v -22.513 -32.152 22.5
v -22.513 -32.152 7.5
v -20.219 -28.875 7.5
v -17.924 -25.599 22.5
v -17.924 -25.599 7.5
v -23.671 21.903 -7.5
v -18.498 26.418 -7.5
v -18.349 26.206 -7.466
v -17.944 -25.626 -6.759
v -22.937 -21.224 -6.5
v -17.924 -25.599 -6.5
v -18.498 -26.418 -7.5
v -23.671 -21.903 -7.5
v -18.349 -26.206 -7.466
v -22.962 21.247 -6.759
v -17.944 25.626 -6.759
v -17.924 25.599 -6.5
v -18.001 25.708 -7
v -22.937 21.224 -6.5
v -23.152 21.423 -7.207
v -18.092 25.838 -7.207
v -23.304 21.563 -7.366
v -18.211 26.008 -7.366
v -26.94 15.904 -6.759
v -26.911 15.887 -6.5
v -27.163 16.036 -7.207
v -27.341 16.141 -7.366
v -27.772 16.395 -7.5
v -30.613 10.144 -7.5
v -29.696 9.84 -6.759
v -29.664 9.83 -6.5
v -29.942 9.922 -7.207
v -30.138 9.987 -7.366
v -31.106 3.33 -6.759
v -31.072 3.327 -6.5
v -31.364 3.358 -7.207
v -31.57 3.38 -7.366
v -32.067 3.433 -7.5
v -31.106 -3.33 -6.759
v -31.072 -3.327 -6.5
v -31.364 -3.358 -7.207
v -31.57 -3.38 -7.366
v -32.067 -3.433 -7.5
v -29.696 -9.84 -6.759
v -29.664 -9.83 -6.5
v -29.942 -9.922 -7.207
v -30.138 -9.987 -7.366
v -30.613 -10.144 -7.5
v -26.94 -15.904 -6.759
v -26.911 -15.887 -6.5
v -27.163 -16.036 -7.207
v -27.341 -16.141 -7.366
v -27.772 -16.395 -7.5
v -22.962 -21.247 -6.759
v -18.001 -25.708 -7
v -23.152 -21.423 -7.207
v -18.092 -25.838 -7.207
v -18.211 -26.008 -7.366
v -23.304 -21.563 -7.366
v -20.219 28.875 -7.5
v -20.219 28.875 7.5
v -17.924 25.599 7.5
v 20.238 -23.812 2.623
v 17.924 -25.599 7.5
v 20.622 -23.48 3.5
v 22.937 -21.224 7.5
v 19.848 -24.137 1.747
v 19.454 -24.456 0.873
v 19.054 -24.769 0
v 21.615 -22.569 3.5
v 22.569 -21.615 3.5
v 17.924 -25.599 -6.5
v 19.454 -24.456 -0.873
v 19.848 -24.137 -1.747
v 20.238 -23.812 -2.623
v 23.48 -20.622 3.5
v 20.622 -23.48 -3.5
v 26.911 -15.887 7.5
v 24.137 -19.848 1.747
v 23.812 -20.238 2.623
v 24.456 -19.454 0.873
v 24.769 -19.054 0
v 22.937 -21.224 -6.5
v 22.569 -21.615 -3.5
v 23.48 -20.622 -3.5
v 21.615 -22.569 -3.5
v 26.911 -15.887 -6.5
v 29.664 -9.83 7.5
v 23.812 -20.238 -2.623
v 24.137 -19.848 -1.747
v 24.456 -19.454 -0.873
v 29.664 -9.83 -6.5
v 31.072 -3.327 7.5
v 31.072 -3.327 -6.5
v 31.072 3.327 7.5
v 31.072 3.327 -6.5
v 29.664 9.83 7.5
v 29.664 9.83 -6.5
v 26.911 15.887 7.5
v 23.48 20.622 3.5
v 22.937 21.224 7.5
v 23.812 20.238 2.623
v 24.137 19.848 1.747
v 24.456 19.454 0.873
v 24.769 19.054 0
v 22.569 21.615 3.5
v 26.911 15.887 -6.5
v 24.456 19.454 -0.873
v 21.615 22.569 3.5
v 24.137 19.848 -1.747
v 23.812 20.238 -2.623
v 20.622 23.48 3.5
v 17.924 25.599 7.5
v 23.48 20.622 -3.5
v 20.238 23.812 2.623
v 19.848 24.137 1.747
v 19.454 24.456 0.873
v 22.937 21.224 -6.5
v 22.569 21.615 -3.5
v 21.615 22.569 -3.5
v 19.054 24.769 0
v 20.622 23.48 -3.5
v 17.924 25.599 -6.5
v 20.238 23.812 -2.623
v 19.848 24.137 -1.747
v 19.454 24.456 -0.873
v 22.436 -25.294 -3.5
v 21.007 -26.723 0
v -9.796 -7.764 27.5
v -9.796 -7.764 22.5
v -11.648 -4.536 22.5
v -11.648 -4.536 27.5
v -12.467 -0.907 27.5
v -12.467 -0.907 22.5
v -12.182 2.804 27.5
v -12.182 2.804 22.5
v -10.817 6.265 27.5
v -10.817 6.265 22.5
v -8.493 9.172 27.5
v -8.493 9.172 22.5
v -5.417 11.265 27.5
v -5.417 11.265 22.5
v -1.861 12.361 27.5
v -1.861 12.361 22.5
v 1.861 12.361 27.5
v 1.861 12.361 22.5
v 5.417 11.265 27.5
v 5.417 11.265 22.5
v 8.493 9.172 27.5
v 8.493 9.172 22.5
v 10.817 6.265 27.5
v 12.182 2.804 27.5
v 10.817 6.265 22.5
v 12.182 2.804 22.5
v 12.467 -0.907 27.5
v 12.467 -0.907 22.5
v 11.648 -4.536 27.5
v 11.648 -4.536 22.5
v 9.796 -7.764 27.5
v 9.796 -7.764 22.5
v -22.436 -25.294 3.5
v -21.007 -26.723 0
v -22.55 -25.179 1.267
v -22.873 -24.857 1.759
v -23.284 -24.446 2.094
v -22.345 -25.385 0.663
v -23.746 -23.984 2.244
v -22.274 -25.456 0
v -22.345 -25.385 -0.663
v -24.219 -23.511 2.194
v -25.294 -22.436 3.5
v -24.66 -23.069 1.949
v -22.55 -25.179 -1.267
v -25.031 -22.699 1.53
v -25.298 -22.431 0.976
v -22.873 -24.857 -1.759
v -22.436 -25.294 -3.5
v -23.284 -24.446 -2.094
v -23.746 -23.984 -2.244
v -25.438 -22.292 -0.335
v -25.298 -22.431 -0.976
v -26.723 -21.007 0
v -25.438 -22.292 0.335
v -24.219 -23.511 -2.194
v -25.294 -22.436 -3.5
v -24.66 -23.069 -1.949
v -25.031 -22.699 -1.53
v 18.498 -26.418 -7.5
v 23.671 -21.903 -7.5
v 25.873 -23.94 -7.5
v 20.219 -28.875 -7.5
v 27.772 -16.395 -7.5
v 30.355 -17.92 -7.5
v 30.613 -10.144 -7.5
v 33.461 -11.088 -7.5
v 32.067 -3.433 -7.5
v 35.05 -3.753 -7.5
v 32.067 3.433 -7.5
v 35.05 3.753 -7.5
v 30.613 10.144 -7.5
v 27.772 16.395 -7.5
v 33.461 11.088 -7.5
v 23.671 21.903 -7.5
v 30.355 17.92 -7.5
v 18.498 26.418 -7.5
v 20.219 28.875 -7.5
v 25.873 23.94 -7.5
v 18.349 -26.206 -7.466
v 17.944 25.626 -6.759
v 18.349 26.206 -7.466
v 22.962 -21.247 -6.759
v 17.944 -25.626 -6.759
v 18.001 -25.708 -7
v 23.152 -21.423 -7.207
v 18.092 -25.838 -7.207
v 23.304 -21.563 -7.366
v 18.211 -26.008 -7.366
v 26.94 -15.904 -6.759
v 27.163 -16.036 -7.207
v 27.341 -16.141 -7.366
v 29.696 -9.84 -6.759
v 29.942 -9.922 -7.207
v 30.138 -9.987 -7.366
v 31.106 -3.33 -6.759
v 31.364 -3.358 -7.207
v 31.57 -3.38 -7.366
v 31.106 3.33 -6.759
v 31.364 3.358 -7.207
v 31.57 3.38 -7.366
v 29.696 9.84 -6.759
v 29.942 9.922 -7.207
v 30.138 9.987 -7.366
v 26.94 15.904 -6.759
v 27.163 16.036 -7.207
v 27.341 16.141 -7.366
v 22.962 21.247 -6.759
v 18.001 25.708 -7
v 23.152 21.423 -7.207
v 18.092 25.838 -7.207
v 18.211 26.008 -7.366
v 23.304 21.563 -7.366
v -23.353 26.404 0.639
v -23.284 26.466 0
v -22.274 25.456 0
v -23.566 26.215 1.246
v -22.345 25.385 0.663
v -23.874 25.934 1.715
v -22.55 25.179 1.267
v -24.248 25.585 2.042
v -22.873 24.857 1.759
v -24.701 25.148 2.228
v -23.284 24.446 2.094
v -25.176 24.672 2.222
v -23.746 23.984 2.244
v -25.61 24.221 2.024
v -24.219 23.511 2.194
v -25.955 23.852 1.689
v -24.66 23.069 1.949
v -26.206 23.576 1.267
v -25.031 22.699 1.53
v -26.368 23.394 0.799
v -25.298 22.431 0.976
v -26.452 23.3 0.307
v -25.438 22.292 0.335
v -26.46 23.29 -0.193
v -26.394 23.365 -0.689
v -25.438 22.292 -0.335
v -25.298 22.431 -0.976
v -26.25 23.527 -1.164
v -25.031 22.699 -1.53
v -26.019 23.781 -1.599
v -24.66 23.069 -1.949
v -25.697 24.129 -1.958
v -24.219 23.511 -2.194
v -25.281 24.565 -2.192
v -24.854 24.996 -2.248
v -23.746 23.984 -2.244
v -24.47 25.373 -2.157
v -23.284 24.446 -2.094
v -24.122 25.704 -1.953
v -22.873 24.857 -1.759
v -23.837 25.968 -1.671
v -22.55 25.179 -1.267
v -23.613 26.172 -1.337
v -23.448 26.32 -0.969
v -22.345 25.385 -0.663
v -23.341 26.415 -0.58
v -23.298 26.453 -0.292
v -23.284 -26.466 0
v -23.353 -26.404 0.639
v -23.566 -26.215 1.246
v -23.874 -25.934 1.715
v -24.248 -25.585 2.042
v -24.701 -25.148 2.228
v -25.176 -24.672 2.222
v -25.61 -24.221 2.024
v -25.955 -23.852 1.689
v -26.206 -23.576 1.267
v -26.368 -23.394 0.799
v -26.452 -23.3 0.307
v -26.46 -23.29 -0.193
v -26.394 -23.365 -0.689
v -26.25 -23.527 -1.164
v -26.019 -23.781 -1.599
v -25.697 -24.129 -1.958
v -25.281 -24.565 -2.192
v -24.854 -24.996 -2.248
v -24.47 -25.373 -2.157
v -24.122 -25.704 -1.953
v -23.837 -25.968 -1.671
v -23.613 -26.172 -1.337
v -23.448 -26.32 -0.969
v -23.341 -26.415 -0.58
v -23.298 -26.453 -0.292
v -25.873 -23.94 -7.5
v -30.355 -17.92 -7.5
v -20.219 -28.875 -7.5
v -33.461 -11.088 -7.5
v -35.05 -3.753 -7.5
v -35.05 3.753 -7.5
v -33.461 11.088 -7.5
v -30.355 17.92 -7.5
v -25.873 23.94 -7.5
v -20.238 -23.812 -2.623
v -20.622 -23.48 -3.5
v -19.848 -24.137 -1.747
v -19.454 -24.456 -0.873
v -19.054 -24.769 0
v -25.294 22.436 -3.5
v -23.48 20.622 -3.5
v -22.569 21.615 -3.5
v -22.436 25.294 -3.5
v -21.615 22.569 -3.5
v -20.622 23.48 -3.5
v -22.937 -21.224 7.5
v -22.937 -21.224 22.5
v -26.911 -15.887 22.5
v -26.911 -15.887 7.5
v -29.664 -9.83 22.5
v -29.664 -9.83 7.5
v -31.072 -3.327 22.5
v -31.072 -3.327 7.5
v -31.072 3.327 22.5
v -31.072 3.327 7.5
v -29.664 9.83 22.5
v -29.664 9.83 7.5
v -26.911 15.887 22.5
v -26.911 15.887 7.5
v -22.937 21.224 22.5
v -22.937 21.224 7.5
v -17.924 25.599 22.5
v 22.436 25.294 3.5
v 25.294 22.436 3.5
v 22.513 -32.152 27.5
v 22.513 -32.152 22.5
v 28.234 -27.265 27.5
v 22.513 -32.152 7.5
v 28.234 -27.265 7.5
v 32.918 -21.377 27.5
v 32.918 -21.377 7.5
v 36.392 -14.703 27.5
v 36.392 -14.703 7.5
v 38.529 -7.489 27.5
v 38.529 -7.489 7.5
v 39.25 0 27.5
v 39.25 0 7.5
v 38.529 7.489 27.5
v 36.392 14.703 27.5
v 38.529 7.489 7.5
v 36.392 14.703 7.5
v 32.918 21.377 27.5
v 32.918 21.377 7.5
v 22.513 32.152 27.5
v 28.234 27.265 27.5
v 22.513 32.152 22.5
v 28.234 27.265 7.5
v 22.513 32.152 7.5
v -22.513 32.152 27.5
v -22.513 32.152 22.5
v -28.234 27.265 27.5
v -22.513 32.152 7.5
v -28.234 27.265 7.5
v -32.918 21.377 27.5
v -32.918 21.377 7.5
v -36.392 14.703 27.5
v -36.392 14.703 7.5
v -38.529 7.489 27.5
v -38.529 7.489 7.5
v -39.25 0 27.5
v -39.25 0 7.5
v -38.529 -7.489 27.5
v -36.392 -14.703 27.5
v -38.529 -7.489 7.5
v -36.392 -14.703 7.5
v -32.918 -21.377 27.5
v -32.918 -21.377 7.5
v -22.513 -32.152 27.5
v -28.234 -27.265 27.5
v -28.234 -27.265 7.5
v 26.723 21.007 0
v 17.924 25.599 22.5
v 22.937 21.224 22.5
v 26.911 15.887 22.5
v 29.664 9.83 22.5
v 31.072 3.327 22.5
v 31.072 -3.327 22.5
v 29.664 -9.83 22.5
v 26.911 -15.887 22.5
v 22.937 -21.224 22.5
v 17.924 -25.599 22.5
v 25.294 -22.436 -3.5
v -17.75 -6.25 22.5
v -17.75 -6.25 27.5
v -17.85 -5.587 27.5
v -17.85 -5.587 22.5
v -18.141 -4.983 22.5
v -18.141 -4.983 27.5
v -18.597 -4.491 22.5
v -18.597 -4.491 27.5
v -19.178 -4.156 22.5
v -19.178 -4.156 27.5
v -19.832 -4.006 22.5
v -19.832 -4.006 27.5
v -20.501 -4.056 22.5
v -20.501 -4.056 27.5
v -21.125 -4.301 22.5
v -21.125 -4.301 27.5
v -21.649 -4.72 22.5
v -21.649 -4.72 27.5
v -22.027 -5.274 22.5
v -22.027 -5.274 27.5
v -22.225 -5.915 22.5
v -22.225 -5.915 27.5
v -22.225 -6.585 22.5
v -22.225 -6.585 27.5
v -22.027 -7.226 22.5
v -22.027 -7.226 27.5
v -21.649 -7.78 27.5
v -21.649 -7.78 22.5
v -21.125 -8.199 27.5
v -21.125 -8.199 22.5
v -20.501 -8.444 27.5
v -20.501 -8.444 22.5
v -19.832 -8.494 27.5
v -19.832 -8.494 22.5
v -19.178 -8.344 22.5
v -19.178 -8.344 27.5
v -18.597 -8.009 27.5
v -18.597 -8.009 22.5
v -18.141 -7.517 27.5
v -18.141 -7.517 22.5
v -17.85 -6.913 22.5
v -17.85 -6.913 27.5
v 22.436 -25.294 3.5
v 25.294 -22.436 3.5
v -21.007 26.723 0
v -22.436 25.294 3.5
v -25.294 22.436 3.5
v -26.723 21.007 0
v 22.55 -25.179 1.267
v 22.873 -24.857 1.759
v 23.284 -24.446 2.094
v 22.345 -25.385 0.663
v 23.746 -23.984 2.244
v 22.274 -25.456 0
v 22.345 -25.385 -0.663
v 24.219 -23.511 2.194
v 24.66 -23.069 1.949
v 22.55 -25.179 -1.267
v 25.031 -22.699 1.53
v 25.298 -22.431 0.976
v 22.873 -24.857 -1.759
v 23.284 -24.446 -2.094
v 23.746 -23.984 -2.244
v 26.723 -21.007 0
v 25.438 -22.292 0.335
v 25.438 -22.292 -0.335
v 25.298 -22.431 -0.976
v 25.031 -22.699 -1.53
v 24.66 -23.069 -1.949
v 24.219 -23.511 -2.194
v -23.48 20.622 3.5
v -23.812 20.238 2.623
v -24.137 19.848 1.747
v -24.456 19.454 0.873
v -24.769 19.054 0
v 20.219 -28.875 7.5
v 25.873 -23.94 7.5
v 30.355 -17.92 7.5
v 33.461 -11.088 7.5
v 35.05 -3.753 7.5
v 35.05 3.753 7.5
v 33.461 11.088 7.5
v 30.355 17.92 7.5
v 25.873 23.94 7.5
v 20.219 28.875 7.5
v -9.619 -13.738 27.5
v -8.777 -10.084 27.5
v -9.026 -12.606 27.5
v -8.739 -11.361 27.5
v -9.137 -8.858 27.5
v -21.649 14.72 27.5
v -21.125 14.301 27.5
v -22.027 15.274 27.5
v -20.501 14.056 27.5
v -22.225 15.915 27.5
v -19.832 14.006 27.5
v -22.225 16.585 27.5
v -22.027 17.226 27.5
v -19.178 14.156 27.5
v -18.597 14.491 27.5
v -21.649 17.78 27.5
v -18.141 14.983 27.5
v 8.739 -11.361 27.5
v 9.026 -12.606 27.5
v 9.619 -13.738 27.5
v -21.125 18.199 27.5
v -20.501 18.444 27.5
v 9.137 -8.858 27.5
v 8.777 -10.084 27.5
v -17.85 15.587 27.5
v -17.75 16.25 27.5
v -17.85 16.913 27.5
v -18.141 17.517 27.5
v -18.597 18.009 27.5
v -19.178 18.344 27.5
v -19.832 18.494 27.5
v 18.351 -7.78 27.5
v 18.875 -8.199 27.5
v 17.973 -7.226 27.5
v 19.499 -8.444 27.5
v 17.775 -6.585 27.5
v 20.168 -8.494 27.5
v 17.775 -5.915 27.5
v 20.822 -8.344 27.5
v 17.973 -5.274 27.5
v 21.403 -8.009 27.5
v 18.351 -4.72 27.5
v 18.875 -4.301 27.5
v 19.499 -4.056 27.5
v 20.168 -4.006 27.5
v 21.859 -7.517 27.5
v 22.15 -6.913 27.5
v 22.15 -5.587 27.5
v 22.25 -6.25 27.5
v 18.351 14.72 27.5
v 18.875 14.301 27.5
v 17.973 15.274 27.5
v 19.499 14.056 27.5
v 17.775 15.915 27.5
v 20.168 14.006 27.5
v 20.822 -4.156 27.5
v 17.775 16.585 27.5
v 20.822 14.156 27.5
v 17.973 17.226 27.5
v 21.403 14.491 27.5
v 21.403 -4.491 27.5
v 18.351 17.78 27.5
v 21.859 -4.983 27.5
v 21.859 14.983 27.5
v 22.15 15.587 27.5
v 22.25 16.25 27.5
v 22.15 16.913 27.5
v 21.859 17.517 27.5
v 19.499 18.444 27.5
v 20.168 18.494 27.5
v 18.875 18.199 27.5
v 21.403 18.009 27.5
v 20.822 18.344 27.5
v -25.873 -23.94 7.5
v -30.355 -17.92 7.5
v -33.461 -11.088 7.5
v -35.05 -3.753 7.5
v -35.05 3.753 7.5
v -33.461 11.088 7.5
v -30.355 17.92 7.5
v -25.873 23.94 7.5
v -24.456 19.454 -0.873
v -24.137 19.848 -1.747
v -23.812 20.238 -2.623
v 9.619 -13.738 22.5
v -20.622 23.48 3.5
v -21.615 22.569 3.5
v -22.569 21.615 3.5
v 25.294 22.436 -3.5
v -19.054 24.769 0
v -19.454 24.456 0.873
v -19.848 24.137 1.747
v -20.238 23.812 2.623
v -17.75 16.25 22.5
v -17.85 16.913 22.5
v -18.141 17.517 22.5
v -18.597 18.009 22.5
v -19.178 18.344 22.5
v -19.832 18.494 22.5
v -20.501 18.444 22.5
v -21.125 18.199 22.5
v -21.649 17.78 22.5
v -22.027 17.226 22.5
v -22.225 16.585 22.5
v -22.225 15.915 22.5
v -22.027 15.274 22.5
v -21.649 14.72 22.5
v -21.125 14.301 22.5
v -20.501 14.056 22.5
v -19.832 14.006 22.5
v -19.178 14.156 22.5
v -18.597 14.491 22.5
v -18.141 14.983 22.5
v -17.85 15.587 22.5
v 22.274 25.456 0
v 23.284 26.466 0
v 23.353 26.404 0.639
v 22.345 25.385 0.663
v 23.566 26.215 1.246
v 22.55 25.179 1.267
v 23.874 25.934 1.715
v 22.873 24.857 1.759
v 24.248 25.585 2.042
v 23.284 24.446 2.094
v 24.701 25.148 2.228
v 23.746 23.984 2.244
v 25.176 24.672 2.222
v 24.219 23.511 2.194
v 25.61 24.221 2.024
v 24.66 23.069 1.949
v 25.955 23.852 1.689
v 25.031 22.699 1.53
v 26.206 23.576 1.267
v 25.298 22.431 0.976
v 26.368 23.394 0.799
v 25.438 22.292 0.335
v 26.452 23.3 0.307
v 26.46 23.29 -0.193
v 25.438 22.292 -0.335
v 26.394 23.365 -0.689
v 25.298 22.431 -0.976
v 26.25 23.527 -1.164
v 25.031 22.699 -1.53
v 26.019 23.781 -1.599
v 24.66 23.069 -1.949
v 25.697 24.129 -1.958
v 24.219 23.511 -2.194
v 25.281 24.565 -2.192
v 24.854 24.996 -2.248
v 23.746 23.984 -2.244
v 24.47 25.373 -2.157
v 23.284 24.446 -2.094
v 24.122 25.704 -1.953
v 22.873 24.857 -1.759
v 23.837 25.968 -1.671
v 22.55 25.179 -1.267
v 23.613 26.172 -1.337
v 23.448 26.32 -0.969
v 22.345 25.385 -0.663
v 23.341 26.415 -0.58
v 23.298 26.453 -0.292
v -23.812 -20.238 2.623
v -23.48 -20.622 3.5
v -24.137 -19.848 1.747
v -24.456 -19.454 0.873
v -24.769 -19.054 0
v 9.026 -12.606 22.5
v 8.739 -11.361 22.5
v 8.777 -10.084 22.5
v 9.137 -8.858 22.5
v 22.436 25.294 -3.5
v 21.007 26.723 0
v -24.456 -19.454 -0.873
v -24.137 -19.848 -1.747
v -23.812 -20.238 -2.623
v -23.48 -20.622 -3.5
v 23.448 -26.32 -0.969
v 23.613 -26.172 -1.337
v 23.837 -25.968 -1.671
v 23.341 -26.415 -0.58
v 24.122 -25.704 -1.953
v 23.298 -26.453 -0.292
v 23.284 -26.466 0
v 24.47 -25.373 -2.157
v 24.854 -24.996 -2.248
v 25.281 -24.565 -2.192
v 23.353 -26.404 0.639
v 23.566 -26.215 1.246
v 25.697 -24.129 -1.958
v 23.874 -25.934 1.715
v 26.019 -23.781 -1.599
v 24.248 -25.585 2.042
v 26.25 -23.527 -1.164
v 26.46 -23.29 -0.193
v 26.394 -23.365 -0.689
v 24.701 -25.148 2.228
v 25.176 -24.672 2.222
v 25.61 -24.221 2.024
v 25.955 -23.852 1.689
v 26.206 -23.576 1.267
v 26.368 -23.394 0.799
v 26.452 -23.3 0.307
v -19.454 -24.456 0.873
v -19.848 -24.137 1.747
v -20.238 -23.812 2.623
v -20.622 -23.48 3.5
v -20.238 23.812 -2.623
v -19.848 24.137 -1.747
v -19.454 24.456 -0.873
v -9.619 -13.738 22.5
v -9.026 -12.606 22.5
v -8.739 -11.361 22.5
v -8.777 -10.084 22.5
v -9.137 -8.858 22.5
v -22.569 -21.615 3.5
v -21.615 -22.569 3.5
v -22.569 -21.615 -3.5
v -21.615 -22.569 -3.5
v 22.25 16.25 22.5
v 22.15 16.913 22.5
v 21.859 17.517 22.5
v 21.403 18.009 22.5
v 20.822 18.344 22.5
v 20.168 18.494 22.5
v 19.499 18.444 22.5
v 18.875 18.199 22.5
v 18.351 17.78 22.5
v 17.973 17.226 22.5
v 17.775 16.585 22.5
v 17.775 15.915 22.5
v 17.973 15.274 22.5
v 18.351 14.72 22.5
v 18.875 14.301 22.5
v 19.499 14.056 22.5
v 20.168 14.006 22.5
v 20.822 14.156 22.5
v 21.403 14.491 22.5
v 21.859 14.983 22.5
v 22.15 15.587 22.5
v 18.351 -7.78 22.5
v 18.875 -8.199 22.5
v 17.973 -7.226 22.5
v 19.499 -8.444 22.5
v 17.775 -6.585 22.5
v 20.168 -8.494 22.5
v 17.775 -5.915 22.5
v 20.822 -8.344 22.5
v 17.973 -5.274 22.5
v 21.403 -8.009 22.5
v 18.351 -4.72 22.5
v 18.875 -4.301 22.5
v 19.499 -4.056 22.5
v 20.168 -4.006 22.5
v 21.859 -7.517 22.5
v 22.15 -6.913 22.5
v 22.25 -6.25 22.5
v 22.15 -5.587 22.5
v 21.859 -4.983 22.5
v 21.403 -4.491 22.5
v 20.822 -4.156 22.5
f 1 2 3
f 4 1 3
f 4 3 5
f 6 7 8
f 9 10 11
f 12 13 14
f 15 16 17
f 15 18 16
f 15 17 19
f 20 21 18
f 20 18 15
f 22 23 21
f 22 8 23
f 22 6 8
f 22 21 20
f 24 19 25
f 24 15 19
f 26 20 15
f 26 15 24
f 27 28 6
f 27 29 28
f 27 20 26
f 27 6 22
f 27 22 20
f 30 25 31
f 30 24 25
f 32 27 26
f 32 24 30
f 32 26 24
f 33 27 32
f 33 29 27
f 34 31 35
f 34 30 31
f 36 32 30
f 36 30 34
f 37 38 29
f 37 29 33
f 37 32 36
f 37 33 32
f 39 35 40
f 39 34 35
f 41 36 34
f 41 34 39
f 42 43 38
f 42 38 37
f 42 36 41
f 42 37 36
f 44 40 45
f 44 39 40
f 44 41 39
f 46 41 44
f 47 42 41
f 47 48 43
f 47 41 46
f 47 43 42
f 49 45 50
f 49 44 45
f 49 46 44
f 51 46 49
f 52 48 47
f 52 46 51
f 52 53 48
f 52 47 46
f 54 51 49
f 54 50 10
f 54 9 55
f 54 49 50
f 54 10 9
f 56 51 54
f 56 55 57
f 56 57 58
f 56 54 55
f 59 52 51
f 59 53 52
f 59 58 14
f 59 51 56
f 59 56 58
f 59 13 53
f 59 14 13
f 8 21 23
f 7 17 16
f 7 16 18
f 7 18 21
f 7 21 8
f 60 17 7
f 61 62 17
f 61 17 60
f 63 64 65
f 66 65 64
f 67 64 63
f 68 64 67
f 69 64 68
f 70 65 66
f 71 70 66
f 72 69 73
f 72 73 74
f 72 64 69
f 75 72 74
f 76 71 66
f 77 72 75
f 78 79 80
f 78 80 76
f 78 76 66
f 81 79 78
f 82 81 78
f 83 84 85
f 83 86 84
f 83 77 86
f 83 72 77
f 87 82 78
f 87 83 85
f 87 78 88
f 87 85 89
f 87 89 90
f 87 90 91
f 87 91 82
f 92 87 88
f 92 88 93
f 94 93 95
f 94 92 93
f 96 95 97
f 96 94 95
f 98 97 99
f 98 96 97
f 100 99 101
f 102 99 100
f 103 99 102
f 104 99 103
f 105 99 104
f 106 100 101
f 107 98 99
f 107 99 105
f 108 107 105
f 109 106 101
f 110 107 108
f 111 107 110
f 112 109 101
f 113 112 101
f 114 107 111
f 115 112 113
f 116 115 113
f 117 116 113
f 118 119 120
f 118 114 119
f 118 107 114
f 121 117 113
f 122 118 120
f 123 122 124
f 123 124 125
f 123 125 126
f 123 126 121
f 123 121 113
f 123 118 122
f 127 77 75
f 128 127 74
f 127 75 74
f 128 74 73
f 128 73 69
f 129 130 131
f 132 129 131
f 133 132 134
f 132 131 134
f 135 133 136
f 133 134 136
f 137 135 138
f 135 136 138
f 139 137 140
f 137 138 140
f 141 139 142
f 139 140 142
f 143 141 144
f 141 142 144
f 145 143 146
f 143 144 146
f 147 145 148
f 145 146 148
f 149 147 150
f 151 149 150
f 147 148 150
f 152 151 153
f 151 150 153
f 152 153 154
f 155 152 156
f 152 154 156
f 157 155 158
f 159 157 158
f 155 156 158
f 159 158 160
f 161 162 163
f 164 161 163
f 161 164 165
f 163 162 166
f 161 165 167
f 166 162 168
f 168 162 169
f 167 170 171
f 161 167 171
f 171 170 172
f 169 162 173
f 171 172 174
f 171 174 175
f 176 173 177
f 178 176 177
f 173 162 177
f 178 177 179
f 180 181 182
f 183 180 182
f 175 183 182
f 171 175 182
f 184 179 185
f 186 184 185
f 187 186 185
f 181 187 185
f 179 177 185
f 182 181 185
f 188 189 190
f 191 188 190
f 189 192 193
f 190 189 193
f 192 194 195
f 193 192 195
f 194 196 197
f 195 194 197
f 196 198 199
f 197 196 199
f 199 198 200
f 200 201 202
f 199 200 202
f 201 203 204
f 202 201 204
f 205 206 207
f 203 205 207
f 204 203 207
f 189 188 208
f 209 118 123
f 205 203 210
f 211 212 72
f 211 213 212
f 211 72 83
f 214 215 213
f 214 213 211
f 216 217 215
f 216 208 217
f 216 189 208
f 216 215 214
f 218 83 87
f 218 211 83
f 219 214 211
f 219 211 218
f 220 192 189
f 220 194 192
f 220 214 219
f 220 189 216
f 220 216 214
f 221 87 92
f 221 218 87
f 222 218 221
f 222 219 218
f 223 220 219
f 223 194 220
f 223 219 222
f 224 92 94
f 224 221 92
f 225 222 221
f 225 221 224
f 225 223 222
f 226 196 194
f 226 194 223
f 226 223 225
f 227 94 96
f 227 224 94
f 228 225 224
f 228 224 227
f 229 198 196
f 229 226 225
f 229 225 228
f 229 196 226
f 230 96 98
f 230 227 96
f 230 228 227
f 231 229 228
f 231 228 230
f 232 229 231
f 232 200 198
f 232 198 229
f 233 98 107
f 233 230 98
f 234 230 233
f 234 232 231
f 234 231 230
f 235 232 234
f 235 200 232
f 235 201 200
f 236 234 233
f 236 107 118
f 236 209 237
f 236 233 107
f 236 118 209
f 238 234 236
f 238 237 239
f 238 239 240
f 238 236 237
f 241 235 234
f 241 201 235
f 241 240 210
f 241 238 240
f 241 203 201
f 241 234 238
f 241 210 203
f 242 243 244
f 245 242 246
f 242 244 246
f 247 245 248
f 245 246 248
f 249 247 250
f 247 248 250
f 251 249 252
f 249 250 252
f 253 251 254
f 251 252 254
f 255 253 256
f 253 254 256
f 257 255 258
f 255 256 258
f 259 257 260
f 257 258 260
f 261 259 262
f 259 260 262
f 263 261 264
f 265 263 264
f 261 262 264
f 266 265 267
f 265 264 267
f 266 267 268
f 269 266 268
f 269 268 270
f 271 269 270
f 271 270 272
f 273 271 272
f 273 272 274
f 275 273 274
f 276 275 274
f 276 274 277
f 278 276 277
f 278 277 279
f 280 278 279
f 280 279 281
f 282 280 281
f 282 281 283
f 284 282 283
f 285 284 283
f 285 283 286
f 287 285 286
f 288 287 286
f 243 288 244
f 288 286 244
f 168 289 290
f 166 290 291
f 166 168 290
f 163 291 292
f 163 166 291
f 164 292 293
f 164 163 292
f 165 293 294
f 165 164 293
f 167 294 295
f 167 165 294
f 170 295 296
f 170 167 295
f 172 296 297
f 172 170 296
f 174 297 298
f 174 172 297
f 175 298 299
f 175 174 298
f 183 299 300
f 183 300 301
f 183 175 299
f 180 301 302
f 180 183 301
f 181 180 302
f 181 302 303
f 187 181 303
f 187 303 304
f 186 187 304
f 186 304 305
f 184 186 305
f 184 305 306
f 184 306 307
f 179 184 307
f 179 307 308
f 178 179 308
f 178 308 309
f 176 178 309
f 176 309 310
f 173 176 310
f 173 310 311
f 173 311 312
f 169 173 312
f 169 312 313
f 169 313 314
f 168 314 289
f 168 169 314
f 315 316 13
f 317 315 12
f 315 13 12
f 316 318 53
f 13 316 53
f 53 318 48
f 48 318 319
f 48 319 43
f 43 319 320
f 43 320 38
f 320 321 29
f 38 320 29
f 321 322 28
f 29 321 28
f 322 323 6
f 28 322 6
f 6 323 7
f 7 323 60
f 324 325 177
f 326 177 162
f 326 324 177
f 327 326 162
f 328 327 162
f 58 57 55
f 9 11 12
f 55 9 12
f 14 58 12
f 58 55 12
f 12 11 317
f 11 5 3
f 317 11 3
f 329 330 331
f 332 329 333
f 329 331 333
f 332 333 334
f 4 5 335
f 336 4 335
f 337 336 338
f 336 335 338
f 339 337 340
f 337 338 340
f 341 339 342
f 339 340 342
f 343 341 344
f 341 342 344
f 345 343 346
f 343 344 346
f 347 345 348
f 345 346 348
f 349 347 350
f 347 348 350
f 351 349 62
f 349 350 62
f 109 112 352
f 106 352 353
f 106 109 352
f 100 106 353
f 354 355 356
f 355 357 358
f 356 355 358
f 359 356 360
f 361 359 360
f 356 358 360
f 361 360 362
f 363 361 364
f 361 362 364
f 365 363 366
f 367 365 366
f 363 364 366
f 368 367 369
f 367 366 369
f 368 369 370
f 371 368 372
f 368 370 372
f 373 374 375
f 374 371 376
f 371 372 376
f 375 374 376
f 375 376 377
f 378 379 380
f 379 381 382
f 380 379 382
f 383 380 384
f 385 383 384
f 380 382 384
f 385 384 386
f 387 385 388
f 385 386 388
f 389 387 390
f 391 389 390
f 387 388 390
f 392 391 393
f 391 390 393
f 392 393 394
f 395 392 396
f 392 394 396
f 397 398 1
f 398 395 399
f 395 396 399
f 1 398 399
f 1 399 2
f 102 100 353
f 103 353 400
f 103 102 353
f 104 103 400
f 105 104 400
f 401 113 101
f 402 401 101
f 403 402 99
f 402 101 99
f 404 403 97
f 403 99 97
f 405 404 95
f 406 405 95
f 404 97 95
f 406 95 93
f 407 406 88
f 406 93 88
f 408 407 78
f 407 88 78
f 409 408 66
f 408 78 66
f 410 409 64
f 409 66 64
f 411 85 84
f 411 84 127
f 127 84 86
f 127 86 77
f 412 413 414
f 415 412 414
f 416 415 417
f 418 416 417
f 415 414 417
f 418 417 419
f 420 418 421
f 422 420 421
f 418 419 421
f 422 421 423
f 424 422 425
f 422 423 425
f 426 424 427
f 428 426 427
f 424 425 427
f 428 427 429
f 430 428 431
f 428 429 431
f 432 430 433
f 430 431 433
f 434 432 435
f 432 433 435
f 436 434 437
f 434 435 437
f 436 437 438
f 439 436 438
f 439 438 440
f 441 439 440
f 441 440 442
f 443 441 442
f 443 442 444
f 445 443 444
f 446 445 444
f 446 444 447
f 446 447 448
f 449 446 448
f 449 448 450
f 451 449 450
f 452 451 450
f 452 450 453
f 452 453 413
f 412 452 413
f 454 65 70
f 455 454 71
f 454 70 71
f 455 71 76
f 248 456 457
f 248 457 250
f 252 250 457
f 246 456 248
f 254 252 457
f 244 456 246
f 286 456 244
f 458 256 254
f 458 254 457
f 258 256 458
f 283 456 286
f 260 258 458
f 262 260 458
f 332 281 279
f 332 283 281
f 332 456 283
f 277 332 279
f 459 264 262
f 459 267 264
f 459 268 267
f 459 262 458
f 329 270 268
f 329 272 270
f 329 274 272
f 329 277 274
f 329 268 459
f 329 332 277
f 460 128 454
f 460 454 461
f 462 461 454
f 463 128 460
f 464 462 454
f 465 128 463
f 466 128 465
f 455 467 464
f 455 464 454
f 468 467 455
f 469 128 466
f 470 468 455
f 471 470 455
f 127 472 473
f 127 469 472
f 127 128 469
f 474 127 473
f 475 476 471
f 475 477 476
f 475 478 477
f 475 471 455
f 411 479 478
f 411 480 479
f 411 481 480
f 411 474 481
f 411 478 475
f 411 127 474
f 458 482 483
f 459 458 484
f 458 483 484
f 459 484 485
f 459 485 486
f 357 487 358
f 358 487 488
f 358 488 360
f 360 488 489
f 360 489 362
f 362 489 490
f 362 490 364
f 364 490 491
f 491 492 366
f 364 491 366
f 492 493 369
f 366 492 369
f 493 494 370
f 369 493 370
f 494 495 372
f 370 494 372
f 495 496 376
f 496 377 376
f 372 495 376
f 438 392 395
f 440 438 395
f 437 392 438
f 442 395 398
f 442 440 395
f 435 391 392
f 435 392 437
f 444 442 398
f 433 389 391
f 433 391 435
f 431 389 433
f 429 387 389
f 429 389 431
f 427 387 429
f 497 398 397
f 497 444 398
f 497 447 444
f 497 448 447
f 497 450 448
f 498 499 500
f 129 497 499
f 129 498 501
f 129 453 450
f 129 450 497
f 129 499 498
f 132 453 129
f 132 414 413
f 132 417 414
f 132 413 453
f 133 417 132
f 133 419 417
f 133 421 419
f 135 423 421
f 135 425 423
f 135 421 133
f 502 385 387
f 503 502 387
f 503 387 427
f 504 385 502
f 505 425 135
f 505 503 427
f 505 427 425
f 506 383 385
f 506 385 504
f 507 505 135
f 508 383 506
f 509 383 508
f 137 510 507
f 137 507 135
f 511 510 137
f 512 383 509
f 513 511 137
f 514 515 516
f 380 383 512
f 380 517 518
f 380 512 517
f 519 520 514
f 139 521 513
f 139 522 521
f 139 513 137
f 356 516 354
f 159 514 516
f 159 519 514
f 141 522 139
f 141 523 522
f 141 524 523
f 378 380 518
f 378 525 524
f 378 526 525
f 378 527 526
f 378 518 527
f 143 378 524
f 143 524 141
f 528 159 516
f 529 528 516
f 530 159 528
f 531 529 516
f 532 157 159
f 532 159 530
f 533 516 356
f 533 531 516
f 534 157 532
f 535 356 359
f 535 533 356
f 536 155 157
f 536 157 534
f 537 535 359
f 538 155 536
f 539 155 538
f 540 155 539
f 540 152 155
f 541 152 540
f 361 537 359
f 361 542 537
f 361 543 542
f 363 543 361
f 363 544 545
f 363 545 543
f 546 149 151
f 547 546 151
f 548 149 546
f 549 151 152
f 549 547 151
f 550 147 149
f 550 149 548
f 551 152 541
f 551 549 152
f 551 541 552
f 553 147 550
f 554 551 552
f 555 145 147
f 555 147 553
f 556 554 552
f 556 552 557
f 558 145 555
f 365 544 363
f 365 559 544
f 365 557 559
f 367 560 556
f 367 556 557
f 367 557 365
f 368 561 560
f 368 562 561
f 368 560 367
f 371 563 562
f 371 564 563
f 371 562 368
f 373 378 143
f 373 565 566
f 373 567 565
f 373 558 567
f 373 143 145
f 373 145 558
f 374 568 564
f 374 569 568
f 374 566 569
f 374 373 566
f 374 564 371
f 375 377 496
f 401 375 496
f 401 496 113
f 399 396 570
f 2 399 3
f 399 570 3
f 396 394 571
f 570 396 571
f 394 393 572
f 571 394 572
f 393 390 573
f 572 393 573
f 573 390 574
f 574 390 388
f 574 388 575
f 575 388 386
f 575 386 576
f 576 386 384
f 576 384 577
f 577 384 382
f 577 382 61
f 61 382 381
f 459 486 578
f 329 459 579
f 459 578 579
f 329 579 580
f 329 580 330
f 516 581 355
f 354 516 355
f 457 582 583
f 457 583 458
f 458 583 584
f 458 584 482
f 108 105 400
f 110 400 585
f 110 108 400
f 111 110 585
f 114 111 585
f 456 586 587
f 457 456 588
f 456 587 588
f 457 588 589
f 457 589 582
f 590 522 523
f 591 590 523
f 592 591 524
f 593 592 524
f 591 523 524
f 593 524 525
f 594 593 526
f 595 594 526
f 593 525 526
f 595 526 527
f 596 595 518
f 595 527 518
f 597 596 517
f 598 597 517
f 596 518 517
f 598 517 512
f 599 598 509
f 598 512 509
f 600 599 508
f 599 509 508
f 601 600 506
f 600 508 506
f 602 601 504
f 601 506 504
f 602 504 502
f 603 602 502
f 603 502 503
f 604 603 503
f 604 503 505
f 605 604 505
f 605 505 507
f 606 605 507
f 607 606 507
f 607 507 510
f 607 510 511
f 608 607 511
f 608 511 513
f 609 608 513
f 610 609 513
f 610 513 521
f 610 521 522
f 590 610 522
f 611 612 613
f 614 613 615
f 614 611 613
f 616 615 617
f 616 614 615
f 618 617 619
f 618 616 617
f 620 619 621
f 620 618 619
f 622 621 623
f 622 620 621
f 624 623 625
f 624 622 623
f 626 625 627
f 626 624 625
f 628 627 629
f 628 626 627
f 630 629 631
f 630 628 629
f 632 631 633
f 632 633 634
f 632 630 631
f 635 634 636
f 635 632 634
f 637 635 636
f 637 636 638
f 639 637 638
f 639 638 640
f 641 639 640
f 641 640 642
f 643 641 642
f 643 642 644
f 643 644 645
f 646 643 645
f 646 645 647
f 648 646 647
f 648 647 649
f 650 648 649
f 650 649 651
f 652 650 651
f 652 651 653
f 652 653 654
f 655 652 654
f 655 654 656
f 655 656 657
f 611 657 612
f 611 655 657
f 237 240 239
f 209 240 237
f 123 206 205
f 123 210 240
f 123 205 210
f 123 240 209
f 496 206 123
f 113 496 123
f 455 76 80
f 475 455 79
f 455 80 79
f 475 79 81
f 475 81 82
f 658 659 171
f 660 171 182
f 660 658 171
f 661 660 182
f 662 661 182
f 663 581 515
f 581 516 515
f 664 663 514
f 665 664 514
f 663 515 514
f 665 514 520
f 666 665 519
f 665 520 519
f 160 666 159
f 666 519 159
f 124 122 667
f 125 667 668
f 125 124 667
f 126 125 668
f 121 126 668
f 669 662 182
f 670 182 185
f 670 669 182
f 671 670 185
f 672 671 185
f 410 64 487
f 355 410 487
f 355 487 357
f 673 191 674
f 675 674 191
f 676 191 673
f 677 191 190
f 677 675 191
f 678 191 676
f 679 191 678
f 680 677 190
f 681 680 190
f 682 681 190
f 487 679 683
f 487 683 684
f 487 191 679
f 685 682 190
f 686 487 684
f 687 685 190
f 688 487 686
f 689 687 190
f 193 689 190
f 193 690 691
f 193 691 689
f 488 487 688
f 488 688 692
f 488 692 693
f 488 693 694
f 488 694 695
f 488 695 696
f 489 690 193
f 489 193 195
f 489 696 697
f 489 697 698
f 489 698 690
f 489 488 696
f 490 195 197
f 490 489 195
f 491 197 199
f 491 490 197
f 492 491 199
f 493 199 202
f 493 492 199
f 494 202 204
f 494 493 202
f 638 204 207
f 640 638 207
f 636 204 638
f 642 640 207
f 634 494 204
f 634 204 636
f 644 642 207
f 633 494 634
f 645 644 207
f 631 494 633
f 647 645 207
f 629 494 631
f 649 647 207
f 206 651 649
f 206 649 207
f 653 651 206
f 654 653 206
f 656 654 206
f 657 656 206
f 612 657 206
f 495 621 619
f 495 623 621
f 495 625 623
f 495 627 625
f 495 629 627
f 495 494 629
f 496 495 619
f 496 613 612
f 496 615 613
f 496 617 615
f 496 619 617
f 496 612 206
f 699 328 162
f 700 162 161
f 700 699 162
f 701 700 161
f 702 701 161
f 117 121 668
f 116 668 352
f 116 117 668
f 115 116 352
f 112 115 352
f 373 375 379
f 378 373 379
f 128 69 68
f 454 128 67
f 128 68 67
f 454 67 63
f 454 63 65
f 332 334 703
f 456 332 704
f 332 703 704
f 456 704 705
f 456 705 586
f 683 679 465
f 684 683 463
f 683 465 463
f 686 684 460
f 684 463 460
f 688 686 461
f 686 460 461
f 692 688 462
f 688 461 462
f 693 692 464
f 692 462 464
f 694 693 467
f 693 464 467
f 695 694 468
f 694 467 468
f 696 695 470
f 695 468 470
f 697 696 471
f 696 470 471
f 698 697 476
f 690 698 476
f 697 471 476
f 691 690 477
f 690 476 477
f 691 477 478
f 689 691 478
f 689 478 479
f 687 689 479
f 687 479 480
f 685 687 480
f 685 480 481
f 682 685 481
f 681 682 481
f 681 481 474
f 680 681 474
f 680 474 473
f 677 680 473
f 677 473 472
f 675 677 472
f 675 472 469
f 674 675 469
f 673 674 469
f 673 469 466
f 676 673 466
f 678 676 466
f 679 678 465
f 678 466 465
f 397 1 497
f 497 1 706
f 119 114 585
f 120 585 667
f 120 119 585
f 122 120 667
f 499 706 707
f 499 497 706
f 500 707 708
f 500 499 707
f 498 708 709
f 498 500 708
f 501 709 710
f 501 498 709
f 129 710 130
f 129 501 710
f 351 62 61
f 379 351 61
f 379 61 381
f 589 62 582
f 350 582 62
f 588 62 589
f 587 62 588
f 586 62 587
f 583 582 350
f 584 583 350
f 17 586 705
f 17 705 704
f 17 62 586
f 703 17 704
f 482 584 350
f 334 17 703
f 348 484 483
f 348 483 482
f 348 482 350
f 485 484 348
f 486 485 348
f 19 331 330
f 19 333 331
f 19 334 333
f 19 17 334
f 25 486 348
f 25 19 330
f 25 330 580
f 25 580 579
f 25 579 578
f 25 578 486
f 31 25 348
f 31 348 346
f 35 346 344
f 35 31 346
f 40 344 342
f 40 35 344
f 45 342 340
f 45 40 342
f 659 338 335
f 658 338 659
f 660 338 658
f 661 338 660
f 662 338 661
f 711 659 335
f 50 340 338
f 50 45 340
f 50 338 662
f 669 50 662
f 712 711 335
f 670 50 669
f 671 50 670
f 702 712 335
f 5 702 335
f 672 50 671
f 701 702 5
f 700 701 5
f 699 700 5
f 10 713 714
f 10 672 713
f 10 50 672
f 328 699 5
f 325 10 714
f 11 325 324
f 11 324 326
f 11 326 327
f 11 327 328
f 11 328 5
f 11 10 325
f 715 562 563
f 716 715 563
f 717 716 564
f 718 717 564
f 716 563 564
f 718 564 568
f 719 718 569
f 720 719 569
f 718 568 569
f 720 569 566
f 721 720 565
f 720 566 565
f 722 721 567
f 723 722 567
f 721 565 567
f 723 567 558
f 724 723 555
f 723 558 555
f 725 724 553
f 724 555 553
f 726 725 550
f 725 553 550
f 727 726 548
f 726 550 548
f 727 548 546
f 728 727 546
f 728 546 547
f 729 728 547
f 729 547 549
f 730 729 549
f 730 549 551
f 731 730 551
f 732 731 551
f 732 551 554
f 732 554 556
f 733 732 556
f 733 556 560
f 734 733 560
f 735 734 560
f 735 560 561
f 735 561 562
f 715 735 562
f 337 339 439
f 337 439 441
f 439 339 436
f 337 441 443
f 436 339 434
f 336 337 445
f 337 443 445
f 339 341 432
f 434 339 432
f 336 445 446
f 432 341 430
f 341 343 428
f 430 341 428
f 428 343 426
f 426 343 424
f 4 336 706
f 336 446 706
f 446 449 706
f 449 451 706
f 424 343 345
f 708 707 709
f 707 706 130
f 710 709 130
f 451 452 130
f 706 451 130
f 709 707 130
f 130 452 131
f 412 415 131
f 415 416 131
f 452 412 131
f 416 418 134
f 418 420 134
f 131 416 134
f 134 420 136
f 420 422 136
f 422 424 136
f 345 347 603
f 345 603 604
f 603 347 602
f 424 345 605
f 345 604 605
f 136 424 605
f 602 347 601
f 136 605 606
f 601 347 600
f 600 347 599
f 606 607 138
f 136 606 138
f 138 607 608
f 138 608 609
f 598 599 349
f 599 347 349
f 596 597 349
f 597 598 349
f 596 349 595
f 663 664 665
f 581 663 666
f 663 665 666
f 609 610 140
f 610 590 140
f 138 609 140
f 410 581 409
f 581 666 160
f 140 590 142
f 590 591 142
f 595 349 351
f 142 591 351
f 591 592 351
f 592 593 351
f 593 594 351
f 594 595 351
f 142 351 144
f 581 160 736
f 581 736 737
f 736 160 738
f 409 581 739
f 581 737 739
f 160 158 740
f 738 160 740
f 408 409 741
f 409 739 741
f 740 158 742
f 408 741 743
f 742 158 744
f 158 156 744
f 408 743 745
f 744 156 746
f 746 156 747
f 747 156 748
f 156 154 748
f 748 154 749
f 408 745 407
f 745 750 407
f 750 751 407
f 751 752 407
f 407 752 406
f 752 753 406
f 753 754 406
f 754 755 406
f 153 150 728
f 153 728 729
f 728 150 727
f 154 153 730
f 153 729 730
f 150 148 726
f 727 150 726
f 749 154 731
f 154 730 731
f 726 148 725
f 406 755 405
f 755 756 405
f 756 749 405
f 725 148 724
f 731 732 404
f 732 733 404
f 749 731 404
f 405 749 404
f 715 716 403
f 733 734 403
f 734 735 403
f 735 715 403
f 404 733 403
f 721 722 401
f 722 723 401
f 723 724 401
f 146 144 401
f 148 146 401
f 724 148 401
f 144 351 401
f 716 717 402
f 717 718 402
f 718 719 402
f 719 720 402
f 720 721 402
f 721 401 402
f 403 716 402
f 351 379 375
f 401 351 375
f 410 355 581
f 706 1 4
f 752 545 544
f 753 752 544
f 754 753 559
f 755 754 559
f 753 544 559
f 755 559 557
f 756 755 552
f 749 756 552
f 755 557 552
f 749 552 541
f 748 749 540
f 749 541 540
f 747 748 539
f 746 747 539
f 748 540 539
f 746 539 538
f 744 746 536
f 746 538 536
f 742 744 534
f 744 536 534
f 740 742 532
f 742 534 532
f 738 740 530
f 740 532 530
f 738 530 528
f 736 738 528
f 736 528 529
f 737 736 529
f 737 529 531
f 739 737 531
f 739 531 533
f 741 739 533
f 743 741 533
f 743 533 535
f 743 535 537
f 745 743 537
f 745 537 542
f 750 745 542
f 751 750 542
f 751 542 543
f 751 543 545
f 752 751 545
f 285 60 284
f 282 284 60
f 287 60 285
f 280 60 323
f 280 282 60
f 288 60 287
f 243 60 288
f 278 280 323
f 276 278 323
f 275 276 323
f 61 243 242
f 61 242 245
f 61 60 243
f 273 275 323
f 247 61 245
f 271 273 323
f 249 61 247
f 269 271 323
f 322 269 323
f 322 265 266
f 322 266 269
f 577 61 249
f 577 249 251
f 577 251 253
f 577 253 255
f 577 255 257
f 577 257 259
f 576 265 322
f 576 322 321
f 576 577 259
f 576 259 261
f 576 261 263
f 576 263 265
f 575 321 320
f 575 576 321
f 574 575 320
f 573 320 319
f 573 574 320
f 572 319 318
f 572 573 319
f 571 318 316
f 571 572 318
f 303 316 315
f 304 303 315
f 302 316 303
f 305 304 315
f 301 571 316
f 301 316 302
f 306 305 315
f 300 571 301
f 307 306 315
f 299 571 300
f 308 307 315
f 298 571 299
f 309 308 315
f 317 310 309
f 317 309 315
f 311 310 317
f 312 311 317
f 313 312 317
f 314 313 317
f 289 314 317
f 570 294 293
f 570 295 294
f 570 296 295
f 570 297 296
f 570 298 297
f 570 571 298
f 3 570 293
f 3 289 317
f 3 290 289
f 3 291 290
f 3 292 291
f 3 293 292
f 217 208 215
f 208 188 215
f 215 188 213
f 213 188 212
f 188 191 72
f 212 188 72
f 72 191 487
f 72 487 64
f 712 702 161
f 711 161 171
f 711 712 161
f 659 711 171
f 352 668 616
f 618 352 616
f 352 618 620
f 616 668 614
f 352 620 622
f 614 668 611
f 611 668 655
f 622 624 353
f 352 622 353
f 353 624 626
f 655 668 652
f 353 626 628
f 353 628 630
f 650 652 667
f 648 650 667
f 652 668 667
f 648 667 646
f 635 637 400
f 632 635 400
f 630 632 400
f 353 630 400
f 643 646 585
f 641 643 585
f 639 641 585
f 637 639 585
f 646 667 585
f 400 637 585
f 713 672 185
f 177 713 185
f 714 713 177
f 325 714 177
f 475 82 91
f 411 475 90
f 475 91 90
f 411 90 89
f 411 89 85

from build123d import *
from build123d.topology import SkipClean

# Parameters (mm, degrees)
SKETCH1_R               = 35.25
SKETCH1_R_2             = 31.25
BOSS_EXTRUDE1_DEPTH     = 7.5
CUT_EXTRUDE1_DEPTH      = 51.412052
BOSS_EXTRUDE2_DEPTH     = 15
BOSS_EXTRUDE3_DEPTH     = 5
CUT_EXTRUDE2_START      = -10
SKETCH8_R               = 2.25
CUT_EXTRUDE2_DEPTH      = 97.386619
CUT_EXTRUDE3_START      = -10
CUT_EXTRUDE3_DEPTH      = 12.5
MIRROR3_START           = -10
MIRROR3_COPY_1_SKETCH_R = 2.25
MIRROR3_COPY_1_DEPTH    = 97.386619
MIRROR3_COPY_2_DEPTH    = 12.5
CUT_EXTRUDE4_DEPTH      = 62.638425
CUT_EXTRUDE4_DEPTH_BACK = 62.638425
FILLET1_R               = 5
SKETCH11_R              = 2.25
EXAMPLE_MOUNT_DEPTH     = 62.638425
FILLET2_R               = 1


with BuildPart() as part:
    # Sketch1 → Boss-Extrude1 (new, symmetric)
    with BuildSketch(Plane.XY):
        Circle(SKETCH1_R)
        Circle(SKETCH1_R_2, mode=Mode.SUBTRACT)
    extrude(amount=BOSS_EXTRUDE1_DEPTH, both=True)

    # Sketch2 → Cut-Extrude1 (cut, symmetric)
    with BuildSketch(Plane.XY):
        with BuildLine():
            Line((20.218569, 28.87511), (17.924264, 25.598501))
            ThreePointArc((17.924264, 25.598501), (0, 31.25), (-17.924264, 25.598501))
            Line((-17.924264, 25.598501), (-20.218569, 28.87511))
            ThreePointArc((-20.218569, 28.87511), (0, 35.25), (20.218569, 28.87511))
        make_face()
    cut_extrude1 = extrude(amount=CUT_EXTRUDE1_DEPTH, both=True, mode=Mode.SUBTRACT)

    # Mirror1: Cut-Extrude1 across plane
    add(cut_extrude1.mirror(Plane.ZX), mode=Mode.SUBTRACT)

    # Sketch3 → Boss-Extrude2 (add)
    with SkipClean():  # the faces are left unmerged after this step: merging them gives an invalid solid
        with BuildSketch(Plane.XY.offset(7.5)):
            with BuildLine():
                Line((-17.924264, 25.598501), (-22.512875, 32.151718))
                ThreePointArc((-22.512875, 32.151718), (-39.25, 0), (-22.512875, -32.151718))
                Line((-22.512875, -32.151718), (-17.924264, -25.598501))
                ThreePointArc((-17.924264, -25.598501), (-31.25, 0), (-17.924264, 25.598501))
            make_face()
            with BuildLine():
                Line((17.924264, -25.598501), (22.512875, -32.151718))
                ThreePointArc((22.512875, -32.151718), (39.25, 0), (22.512875, 32.151718))
                Line((22.512875, 32.151718), (17.924264, 25.598501))
                ThreePointArc((17.924264, 25.598501), (31.25, 0), (17.924264, -25.598501))
            make_face()
        extrude(amount=BOSS_EXTRUDE2_DEPTH)

    # Sketch4 → Boss-Extrude3 (add)
    with SkipClean():  # the faces are left unmerged after this step: merging them gives an invalid solid
        with BuildSketch(Plane.XY.offset(22.5)):
            with BuildLine():
                Line((22.512875, 32.151718), (-22.512875, 32.151718))
                ThreePointArc((-22.512875, 32.151718), (-39.25, 0), (-22.512875, -32.151718))
                Line((-22.512875, -32.151718), (22.512875, -32.151718))
                ThreePointArc((22.512875, -32.151718), (39.25, 0), (22.512875, 32.151718))
            make_face()
        extrude(amount=BOSS_EXTRUDE3_DEPTH)

    # Sketch8 → Cut-Extrude2 (cut)
    with SkipClean():  # the faces are left unmerged after this step: merging them gives an invalid solid
        with BuildSketch(Plane(origin=(22.097087, 22.097087, 0), x_dir=(0.7071067811865486, -0.7071067811865465, 0), z_dir=(0.7071067811865465, 0.7071067811865486, 0)).offset(CUT_EXTRUDE2_START)):
            with Locations(Location((0, 0, 0), (0, 0, 180))):
                Circle(SKETCH8_R)
        cut_extrude2 = extrude(amount=CUT_EXTRUDE2_DEPTH, mode=Mode.SUBTRACT)

    # Sketch9 → Cut-Extrude3 (cut)
    with SkipClean():  # the faces are left unmerged after this step: merging them gives an invalid solid
        with BuildSketch(Plane(origin=(22.097087, 22.097087, 0), x_dir=(0.7071067811865486, -0.7071067811865465, 0), z_dir=(0.7071067811865465, 0.7071067811865486, 0)).offset(CUT_EXTRUDE3_START)):
            Polygon((2.020726, -3.5), (4.041452, 0), (2.020726, 3.5), (-2.020726, 3.5), (-4.041452, 0), (-2.020726, -3.5), align=None)
        cut_extrude3 = extrude(amount=CUT_EXTRUDE3_DEPTH, mode=Mode.SUBTRACT)

    # Mirror2: Cut-Extrude2, Cut-Extrude3 across plane
    with SkipClean():  # the faces are left unmerged after this step: merging them gives an invalid solid
        add(cut_extrude2.mirror(Plane.ZX), mode=Mode.SUBTRACT)
        add(cut_extrude3.mirror(Plane.ZX), mode=Mode.SUBTRACT)

    # Mirror3: Cut-Extrude2, Cut-Extrude3 across plane
    with SkipClean():  # the faces are left unmerged after this step: merging them gives an invalid solid
        add(cut_extrude2.mirror(Plane(origin=(0, 0, 0), x_dir=(0, 0, 1), z_dir=(1, 0, 0))), mode=Mode.SUBTRACT)
        add(cut_extrude3.mirror(Plane(origin=(0, 0, 0), x_dir=(0, 0, 1), z_dir=(1, 0, 0))), mode=Mode.SUBTRACT)

    # Mirror3 copy 1 sketch → Mirror3 copy 1 (cut)
    with SkipClean():  # the faces are left unmerged after this step: merging them gives an invalid solid
        with BuildSketch(Plane(origin=(-22.097087, -22.097087, 0), x_dir=(-0.7071067811865486, 0.7071067811865465, 0), z_dir=(-0.7071067811865465, -0.7071067811865486, 0)).offset(MIRROR3_START)):
            with Locations(Location((0, 0, 0), (0, 0, 180))):
                Circle(MIRROR3_COPY_1_SKETCH_R)
        extrude(amount=MIRROR3_COPY_1_DEPTH, mode=Mode.SUBTRACT)

    # Mirror3 copy 2 sketch → Mirror3 copy 2 (cut)
    with SkipClean():  # the faces are left unmerged after this step: merging them gives an invalid solid
        with BuildSketch(Plane(origin=(-22.097087, -22.097087, 0), x_dir=(-0.7071067811865486, 0.7071067811865465, 0), z_dir=(-0.7071067811865465, -0.7071067811865486, 0)).offset(MIRROR3_START)):
            Polygon((2.020726, -3.5), (4.041452, 0), (2.020726, 3.5), (-2.020726, 3.5), (-4.041452, 0), (-2.020726, -3.5), align=None)
        extrude(amount=MIRROR3_COPY_2_DEPTH, mode=Mode.SUBTRACT)

    # Sketch10 → Cut-Extrude4 (cut, two sides: drawn at the far end of the back side and taken through both)
    with SkipClean():  # the faces are left unmerged after this step: merging them gives an invalid solid
        with BuildSketch(Plane.XY.offset(27.5).offset(-CUT_EXTRUDE4_DEPTH_BACK)):
            with BuildLine():
                Line((-22.512875, -32.151718), (-7.169705, -10.239401))
                ThreePointArc((-7.169705, -10.239401), (0, 12.5), (7.169705, -10.239401))
                Line((7.169705, -10.239401), (22.512875, -32.151718))
                Line((22.512875, -32.151718), (-22.512875, -32.151718))
            make_face()
        extrude(amount=CUT_EXTRUDE4_DEPTH + CUT_EXTRUDE4_DEPTH_BACK, mode=Mode.SUBTRACT)

    # Fillet1
    fillet1_edges = [part.edges().sort_by_distance(p)[0] for p in [
        (-7.169705, -10.239401, 25),
        (7.169705, -10.239401, 25),
    ]]
    fillet(fillet1_edges, radius=FILLET1_R)

    # Sketch11 → example_mount (cut, through all)
    with SkipClean():  # the faces are left unmerged after this step: merging them gives an invalid solid
        with BuildSketch(Plane.XY.offset(27.5)):
            with Locations((-20, -6.25)):
                Circle(SKETCH11_R)
            with Locations((-20, 16.25)):
                Circle(SKETCH11_R)
            with Locations((20, 16.25)):
                Circle(SKETCH11_R)
            with Locations((20, -6.25)):
                Circle(SKETCH11_R)
        extrude(amount=-EXAMPLE_MOUNT_DEPTH, mode=Mode.SUBTRACT)

    # Fillet2
    fillet2_edges = [part.edges().sort_by_distance(p)[0] for p in [
        (-31.25, 0, -7.5),
        (31.25, 0, -7.5),
    ]]
    fillet(fillet2_edges, radius=FILLET2_R)


solid = part.part
